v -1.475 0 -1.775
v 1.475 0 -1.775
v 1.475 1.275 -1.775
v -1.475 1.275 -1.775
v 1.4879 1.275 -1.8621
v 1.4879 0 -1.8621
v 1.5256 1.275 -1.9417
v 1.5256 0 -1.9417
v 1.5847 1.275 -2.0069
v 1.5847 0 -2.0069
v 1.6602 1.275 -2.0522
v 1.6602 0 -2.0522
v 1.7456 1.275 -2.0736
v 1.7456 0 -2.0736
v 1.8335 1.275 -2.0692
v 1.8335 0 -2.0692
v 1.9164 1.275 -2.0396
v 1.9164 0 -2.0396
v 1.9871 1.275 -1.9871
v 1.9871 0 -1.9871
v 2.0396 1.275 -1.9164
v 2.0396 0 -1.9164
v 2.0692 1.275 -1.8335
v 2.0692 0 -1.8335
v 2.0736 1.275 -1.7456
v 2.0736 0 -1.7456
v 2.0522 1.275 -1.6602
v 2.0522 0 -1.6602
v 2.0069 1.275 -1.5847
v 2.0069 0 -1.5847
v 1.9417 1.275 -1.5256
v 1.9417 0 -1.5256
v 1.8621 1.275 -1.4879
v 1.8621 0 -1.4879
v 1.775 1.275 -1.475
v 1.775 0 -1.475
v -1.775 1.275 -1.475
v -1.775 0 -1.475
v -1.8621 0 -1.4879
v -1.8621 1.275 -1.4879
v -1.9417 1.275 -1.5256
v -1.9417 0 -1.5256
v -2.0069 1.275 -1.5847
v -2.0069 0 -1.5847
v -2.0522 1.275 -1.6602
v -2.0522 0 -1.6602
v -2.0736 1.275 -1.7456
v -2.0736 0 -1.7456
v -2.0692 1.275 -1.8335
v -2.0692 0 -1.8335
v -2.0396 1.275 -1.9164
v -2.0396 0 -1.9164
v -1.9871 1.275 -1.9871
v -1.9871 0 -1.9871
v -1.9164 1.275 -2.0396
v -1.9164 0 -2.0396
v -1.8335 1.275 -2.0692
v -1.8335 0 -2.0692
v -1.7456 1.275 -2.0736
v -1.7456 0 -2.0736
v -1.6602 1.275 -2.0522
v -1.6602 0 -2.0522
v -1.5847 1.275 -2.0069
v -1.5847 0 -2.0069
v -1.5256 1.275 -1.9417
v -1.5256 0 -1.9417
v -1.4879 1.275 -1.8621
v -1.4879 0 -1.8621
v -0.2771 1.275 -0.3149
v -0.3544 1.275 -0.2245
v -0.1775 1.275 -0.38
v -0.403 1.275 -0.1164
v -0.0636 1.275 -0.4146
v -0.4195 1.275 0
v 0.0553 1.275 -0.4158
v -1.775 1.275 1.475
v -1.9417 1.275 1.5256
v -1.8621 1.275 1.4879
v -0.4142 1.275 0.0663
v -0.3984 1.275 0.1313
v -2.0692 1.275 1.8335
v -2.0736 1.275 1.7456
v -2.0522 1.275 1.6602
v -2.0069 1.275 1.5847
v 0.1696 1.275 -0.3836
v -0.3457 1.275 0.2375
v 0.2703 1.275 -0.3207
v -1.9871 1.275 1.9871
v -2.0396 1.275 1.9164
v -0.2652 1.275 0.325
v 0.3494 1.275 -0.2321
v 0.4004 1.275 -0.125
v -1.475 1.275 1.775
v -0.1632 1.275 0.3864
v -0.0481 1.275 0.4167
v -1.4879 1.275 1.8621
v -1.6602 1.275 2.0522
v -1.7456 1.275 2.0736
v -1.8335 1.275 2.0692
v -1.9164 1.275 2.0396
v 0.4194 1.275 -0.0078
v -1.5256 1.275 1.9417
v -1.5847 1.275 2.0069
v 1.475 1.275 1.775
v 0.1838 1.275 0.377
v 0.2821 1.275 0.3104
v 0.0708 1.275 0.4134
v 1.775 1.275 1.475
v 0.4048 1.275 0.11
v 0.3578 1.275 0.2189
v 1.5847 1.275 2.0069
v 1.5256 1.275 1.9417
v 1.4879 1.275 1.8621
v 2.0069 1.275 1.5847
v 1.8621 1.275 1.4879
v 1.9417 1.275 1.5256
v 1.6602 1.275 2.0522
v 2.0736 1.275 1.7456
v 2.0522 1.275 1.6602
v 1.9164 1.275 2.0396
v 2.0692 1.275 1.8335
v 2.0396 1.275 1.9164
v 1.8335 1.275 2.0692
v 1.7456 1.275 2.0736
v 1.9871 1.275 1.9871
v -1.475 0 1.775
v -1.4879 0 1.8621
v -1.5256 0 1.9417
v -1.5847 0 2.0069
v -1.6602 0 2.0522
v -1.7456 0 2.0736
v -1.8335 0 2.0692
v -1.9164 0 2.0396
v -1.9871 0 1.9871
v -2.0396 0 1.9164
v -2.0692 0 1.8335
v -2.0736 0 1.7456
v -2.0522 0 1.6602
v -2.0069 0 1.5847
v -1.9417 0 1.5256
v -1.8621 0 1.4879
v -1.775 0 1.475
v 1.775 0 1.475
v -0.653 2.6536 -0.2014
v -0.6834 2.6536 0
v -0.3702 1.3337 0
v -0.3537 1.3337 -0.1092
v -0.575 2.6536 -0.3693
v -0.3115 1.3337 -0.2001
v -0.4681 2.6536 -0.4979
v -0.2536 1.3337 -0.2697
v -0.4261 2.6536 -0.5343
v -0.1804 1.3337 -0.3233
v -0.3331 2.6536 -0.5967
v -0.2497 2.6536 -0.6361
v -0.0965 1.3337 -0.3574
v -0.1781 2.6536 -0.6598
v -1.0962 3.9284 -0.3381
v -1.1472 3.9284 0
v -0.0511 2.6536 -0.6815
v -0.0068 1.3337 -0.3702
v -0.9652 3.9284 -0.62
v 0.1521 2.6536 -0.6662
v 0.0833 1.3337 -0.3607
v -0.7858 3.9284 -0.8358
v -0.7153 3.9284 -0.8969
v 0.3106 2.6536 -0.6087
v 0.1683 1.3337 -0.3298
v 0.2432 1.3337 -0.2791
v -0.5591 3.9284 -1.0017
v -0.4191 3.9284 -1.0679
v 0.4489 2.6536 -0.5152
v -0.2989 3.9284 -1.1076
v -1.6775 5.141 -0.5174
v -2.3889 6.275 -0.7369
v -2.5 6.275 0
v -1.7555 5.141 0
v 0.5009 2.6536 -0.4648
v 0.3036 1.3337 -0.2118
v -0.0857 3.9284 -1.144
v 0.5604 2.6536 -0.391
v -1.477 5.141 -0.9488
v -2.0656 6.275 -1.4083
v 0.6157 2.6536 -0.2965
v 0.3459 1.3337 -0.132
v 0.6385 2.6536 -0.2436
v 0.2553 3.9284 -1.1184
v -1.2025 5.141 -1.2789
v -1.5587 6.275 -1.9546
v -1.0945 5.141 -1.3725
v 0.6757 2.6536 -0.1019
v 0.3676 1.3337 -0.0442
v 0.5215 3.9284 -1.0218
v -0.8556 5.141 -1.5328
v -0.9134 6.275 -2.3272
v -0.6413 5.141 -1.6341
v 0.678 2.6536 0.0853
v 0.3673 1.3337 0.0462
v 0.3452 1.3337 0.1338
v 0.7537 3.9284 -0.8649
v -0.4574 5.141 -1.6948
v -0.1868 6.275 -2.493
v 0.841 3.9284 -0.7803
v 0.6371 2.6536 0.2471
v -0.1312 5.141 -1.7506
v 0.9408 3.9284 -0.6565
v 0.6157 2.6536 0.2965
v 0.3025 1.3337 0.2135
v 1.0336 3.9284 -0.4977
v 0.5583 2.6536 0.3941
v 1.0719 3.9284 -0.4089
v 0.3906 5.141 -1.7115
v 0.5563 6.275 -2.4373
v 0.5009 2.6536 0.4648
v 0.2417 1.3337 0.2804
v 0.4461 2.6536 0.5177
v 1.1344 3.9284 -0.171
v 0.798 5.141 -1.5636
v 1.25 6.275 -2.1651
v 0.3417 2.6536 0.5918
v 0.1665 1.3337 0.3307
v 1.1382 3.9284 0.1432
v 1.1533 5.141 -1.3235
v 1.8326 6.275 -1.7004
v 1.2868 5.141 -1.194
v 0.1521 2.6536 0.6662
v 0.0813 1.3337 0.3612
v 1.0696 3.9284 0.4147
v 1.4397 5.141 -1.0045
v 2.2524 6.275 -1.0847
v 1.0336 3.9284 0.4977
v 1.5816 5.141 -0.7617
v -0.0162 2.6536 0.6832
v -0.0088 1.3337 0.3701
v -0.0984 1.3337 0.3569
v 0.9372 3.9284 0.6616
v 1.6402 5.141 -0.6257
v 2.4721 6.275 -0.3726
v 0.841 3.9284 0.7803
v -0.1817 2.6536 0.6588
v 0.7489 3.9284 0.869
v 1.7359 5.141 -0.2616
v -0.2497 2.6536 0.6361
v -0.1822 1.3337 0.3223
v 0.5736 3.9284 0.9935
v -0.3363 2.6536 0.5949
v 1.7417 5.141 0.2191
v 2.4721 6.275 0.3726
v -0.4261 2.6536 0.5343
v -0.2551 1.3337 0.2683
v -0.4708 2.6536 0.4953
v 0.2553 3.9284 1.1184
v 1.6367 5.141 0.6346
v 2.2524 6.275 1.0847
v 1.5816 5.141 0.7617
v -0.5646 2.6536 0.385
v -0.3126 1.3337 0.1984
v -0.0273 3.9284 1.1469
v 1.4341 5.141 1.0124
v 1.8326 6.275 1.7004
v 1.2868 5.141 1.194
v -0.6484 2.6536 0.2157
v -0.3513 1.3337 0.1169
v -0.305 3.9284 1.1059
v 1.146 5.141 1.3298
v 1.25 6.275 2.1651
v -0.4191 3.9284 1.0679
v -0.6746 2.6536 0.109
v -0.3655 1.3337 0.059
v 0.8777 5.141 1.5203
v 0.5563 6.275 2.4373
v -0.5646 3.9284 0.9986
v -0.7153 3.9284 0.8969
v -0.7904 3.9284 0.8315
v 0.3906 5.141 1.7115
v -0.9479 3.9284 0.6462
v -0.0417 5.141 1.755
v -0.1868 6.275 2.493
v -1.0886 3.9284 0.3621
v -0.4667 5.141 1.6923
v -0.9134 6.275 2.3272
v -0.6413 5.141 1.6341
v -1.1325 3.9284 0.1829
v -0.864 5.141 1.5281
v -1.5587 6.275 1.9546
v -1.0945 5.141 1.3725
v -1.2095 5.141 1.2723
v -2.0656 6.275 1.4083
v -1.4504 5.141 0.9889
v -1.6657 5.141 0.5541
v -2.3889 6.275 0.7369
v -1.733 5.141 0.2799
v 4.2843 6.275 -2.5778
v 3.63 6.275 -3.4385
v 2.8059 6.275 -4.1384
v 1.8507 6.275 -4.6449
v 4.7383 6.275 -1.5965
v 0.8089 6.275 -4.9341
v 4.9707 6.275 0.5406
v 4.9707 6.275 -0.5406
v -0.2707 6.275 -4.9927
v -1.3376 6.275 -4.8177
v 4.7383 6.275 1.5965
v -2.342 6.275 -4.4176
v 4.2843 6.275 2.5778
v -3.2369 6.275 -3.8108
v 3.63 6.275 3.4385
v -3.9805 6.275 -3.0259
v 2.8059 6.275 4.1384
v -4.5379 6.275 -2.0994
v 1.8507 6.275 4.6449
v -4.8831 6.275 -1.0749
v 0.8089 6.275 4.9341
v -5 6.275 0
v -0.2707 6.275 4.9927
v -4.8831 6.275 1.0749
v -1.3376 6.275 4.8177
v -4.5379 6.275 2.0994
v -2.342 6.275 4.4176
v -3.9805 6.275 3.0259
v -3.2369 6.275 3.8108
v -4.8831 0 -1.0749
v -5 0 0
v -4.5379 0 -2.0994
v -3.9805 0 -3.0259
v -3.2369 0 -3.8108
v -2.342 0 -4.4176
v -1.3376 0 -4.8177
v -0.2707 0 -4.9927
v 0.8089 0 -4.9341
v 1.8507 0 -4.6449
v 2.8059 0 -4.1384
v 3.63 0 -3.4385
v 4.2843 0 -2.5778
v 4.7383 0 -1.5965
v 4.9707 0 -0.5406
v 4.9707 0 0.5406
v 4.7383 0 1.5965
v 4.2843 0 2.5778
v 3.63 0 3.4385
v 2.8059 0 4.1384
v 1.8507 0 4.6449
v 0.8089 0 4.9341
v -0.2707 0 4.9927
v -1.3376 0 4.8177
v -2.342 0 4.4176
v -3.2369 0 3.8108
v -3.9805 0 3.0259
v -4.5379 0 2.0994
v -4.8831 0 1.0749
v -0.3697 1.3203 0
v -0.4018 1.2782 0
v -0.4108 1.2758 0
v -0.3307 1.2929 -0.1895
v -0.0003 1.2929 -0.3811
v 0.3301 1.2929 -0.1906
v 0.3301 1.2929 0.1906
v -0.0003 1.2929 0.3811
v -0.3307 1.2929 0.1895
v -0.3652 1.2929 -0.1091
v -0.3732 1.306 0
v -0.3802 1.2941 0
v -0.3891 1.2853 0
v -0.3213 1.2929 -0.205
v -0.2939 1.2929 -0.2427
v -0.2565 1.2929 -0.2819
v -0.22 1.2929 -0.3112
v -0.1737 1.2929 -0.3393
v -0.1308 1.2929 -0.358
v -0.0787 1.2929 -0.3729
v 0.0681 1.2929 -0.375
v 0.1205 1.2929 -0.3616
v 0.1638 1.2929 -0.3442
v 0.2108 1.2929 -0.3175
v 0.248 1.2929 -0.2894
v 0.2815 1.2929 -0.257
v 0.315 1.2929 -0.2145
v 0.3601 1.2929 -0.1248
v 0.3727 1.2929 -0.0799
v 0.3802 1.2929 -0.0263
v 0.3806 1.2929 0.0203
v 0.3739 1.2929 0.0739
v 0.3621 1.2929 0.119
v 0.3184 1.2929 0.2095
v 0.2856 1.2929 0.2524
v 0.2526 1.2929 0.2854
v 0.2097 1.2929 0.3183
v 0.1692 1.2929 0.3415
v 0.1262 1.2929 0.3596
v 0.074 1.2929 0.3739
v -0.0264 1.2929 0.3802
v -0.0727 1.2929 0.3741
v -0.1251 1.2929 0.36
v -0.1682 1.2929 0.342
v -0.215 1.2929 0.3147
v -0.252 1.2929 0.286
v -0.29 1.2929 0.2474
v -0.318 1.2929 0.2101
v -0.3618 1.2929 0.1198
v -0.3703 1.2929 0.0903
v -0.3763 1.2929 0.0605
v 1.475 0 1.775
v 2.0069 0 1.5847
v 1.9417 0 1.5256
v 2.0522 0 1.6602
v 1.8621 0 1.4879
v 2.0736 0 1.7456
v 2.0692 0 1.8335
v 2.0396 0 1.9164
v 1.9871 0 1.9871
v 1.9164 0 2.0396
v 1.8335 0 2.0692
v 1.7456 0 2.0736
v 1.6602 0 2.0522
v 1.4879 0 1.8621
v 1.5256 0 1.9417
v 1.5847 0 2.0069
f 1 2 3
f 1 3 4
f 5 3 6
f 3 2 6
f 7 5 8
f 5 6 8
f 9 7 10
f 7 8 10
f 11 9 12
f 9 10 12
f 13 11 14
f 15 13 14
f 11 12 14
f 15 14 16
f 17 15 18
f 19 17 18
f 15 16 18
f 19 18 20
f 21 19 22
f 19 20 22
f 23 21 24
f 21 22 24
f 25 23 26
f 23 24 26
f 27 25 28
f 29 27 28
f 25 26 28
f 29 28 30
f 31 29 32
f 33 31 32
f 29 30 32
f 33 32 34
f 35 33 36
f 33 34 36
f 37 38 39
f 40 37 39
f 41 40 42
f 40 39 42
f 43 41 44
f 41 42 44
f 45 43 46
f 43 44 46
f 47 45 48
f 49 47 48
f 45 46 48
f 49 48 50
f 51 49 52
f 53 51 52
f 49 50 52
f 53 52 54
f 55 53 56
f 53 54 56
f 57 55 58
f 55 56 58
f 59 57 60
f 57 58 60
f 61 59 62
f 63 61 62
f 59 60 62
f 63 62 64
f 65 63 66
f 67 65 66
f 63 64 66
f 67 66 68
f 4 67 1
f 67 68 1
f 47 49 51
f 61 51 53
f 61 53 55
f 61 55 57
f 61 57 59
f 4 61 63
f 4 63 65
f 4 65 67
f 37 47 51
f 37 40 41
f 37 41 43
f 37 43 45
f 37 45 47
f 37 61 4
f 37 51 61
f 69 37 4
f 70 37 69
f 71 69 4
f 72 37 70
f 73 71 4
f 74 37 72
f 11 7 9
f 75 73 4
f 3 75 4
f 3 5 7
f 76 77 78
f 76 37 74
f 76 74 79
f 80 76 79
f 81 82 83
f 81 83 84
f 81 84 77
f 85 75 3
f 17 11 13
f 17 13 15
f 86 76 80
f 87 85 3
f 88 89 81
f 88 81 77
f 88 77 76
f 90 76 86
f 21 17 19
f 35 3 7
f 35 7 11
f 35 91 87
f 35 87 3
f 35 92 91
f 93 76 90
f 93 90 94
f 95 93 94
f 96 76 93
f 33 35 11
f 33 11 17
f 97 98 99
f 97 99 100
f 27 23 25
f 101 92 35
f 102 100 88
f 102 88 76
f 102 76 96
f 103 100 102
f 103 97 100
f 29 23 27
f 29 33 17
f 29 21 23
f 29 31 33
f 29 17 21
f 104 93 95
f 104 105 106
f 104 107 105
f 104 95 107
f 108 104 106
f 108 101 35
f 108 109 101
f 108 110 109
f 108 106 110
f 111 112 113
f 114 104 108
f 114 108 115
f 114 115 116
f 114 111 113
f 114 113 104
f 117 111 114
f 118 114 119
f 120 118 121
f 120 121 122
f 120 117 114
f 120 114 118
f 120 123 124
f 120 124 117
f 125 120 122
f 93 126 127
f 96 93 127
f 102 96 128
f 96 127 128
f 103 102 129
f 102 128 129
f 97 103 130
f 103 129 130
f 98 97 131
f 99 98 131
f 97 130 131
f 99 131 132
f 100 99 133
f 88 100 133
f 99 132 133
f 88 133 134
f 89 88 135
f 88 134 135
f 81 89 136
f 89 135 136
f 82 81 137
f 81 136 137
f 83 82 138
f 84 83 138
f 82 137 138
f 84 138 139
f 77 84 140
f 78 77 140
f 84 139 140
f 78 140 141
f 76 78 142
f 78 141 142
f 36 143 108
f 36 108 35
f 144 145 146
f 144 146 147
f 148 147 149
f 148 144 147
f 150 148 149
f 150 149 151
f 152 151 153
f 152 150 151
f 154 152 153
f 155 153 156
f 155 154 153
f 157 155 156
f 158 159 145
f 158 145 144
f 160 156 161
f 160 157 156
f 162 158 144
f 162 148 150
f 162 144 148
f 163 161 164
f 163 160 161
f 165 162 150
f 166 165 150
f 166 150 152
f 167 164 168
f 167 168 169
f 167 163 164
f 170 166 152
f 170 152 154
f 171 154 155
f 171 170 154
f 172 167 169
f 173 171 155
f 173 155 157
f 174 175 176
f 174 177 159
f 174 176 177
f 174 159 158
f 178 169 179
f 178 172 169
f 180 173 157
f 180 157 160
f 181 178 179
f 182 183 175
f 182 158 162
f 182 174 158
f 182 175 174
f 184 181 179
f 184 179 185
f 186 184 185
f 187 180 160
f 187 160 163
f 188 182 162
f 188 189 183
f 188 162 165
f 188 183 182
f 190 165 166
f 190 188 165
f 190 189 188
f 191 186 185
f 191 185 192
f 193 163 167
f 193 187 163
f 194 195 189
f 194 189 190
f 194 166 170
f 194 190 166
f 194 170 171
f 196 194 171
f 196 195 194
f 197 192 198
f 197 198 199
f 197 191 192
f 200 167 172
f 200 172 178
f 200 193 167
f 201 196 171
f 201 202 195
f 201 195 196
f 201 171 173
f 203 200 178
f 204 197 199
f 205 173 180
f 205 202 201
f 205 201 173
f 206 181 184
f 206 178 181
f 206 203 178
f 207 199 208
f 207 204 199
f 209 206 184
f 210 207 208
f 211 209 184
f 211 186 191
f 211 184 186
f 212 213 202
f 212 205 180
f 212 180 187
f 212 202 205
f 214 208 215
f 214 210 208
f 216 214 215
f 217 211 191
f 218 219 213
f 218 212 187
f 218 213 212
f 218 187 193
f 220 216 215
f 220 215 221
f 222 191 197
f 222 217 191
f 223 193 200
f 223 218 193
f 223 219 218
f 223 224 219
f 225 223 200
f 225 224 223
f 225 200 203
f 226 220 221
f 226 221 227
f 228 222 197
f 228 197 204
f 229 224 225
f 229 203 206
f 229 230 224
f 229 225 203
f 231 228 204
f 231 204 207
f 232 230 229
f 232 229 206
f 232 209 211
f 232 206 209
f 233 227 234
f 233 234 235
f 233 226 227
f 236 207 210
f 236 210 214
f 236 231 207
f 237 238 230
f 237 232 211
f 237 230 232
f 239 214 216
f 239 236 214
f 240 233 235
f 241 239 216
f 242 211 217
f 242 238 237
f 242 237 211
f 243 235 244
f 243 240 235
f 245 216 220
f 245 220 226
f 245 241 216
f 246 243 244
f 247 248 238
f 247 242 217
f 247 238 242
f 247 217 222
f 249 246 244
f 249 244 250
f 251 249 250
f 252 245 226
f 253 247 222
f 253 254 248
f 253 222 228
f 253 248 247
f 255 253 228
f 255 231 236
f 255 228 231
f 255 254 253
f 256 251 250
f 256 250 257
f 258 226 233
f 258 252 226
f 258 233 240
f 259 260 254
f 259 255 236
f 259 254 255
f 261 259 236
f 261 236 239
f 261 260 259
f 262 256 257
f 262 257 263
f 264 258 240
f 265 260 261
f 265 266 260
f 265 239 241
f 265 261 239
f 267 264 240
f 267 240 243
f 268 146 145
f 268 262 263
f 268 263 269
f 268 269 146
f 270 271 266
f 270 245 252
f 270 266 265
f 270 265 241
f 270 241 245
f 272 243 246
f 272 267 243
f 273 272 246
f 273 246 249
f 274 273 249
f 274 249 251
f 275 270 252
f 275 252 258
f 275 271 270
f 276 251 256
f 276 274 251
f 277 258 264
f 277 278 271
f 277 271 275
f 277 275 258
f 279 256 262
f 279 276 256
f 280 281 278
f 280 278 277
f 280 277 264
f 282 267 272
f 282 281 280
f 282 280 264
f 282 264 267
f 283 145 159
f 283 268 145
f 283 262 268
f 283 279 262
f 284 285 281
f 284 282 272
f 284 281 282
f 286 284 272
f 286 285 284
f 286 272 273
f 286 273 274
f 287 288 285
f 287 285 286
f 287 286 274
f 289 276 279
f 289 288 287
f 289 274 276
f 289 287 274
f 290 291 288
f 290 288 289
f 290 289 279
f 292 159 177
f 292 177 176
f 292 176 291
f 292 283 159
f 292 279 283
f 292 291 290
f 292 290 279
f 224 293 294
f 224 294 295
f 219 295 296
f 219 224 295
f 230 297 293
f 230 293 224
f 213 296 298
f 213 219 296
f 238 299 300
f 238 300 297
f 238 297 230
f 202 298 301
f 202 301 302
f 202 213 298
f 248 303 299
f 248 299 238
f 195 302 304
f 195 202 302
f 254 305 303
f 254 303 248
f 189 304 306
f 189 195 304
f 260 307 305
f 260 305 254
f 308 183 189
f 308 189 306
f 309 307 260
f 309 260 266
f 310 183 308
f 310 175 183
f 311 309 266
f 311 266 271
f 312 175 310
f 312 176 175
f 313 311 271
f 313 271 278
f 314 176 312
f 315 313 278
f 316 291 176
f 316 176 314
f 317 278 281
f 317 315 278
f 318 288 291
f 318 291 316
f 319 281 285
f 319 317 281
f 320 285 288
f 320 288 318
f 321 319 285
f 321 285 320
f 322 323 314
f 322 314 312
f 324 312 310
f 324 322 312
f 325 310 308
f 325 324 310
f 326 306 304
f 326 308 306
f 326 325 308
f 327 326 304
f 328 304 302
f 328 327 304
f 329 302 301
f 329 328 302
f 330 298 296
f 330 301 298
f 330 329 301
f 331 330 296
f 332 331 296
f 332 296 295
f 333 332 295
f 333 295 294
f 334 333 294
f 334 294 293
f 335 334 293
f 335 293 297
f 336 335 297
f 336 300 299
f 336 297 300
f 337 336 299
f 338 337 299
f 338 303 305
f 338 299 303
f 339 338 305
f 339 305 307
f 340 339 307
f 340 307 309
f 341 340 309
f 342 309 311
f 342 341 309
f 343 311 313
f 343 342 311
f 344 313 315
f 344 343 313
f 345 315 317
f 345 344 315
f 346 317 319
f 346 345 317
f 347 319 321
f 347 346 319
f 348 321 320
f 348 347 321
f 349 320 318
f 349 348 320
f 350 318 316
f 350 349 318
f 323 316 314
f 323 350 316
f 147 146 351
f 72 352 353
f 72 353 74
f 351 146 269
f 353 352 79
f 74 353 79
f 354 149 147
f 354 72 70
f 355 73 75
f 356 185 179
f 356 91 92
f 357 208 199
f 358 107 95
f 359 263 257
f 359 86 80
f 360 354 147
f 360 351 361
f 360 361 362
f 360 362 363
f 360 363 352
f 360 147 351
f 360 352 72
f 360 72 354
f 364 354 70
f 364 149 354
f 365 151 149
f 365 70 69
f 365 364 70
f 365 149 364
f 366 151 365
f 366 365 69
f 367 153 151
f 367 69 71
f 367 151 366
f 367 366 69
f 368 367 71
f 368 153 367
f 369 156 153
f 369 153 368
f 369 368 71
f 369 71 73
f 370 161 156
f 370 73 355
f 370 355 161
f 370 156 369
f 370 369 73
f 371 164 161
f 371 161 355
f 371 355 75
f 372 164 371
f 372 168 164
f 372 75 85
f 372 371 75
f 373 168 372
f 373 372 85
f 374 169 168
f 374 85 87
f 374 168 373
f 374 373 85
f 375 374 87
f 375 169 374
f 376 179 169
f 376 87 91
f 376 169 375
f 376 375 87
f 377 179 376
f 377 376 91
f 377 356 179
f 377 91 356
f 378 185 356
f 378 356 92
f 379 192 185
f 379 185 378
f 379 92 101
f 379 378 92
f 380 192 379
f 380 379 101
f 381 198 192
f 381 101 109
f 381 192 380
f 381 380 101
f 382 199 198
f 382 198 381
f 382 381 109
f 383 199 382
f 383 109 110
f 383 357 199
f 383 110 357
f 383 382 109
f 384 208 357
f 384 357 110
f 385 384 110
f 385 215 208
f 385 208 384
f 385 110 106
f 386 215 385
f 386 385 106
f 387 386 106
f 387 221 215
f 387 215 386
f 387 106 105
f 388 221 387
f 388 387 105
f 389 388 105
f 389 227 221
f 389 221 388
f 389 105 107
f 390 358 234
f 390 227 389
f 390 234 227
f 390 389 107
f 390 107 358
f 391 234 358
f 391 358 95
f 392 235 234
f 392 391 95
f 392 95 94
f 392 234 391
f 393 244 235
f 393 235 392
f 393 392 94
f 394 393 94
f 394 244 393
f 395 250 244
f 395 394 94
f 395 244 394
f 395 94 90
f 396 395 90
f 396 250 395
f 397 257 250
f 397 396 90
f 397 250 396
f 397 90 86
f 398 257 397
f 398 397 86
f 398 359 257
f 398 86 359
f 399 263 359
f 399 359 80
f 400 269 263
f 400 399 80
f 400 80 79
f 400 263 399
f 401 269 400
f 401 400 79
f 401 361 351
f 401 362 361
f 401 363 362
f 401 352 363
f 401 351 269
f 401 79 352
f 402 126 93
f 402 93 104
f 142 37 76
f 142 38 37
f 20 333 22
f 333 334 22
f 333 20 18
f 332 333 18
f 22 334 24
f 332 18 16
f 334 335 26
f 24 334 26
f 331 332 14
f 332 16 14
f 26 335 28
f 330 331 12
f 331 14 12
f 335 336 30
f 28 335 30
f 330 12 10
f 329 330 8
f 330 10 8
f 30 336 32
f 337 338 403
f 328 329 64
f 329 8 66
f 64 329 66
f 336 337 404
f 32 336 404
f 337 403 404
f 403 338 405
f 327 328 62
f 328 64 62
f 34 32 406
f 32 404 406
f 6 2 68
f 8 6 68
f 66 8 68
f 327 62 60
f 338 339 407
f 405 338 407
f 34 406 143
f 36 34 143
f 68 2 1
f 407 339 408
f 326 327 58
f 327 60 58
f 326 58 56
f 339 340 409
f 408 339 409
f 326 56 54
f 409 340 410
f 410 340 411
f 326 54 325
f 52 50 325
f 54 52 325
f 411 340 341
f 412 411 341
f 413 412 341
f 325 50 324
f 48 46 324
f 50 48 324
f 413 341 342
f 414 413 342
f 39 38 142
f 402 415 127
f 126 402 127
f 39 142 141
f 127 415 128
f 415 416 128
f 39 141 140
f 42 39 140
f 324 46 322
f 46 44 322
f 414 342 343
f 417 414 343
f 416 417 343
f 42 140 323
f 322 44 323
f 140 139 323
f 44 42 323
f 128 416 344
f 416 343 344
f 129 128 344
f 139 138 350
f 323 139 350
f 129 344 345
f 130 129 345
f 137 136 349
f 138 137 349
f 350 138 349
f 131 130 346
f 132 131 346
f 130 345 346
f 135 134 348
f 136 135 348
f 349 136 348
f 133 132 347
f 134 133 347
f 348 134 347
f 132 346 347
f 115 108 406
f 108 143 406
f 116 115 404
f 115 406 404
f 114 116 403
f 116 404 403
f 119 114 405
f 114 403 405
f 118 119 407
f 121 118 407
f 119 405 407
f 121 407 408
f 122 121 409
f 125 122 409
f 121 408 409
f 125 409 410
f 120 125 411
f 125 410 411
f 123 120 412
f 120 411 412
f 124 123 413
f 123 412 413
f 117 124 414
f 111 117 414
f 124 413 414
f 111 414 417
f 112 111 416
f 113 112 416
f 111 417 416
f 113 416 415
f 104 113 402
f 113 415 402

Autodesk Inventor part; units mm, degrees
ref_plane "YZ Plane" through (0, 0, 0) normal (1, 0, 0) x (0, 1, 0)
ref_plane "XZ Plane" through (0, 0, 0) normal (0, 1, 0) x (-1, 0, 0)
ref_plane "XY Plane" through (0, 0, 0) normal (0, 0, 1) x (1, 0, 0)
sketch "Sketch1" plane through (0, 0, 0) normal (0, 1, 0) x (-1, 0, 0)
  circle A0 centre (0, 0) radius 0.36
  circle A1 centre (0, 0) radius 5
  dimension "d2" = 10
  dimension "d24" = 0.72
extrude "Extrusion1" add sketch "Sketch1" along normal blind 6.275
sketch "Sketch2" plane through (0, 6.275, 0) normal (0, 1, 0) x (1, 0, 0)
  circle A0 centre (0, 0) radius 2.5
  dimension "d10" = 5
sketch "Sketch3" plane through (0, 0, 0) normal (0, -1, 0) x (1, 0, 0)
  line L0 (-1.775, 1.775) -> (1.775, 1.775)
  line L1 (1.775, 1.775) -> (1.775, -1.775)
  line L2 (1.775, -1.775) -> (-1.775, -1.775)
  line L3 (-1.775, -1.775) -> (-1.775, 1.775)
  line L4 (-1.775, 1.775) -> (1.775, -1.775) construction
  line L5 (1.775, 1.775) -> (-1.775, -1.775) construction
  arc A0 (1.775, 1.475) -> (1.475, 1.775) centre (1.775, 1.775) ccw
  arc A1 (1.475, -1.775) -> (1.775, -1.475) centre (1.775, -1.775) ccw
  arc A2 (-1.775, -1.475) -> (-1.475, -1.775) centre (-1.775, -1.775) ccw
  arc A3 (-1.475, 1.775) -> (-1.775, 1.475) centre (-1.775, 1.775) ccw
  point P0 (0, 0)
  dimension "d11" = 0.3
  dimension "d12" = 3.55
extrude "Extrusion2" cut sketch "Sketch3" against normal blind 1.275
sketch "Sketch5" plane through (0, 0, 0) normal (0, 0, 1) x (1, 0, 0)
  line L0 (-0.36, 1.275) -> (0.36, 1.275) projected
  line L1 (5, 6.275) -> (-5, 6.275) projected
  arc A0 (-0.36, 1.275) -> (-2.5, 6.275) centre (-11.8917, -0.7026) ccw
  line L2 (0, 1.275) -> (0, 6.275)
  line L3 (0.36, 1.275) -> (0, 1.275)
  line L4 (0.36, 6.275) -> (0.36, 1.275) projected
  line L5 (0.36, 6.275) -> (-2.5, 6.275)
  point P0 (0, 0)
  dimension "d17" = 2.5
  dimension "d23" = 11.7
revolve "Revolution1" cut sketch "Sketch5" angle 360 about axis through (0, 1.275, 0) along (0, 1, 0) contours A0 L1 L2 L0
fillet "Fillet1" radius 0.05 1 edges at (0.36, 1.275, 0)
properties part number "Acoustic Horn 30deg V1"
